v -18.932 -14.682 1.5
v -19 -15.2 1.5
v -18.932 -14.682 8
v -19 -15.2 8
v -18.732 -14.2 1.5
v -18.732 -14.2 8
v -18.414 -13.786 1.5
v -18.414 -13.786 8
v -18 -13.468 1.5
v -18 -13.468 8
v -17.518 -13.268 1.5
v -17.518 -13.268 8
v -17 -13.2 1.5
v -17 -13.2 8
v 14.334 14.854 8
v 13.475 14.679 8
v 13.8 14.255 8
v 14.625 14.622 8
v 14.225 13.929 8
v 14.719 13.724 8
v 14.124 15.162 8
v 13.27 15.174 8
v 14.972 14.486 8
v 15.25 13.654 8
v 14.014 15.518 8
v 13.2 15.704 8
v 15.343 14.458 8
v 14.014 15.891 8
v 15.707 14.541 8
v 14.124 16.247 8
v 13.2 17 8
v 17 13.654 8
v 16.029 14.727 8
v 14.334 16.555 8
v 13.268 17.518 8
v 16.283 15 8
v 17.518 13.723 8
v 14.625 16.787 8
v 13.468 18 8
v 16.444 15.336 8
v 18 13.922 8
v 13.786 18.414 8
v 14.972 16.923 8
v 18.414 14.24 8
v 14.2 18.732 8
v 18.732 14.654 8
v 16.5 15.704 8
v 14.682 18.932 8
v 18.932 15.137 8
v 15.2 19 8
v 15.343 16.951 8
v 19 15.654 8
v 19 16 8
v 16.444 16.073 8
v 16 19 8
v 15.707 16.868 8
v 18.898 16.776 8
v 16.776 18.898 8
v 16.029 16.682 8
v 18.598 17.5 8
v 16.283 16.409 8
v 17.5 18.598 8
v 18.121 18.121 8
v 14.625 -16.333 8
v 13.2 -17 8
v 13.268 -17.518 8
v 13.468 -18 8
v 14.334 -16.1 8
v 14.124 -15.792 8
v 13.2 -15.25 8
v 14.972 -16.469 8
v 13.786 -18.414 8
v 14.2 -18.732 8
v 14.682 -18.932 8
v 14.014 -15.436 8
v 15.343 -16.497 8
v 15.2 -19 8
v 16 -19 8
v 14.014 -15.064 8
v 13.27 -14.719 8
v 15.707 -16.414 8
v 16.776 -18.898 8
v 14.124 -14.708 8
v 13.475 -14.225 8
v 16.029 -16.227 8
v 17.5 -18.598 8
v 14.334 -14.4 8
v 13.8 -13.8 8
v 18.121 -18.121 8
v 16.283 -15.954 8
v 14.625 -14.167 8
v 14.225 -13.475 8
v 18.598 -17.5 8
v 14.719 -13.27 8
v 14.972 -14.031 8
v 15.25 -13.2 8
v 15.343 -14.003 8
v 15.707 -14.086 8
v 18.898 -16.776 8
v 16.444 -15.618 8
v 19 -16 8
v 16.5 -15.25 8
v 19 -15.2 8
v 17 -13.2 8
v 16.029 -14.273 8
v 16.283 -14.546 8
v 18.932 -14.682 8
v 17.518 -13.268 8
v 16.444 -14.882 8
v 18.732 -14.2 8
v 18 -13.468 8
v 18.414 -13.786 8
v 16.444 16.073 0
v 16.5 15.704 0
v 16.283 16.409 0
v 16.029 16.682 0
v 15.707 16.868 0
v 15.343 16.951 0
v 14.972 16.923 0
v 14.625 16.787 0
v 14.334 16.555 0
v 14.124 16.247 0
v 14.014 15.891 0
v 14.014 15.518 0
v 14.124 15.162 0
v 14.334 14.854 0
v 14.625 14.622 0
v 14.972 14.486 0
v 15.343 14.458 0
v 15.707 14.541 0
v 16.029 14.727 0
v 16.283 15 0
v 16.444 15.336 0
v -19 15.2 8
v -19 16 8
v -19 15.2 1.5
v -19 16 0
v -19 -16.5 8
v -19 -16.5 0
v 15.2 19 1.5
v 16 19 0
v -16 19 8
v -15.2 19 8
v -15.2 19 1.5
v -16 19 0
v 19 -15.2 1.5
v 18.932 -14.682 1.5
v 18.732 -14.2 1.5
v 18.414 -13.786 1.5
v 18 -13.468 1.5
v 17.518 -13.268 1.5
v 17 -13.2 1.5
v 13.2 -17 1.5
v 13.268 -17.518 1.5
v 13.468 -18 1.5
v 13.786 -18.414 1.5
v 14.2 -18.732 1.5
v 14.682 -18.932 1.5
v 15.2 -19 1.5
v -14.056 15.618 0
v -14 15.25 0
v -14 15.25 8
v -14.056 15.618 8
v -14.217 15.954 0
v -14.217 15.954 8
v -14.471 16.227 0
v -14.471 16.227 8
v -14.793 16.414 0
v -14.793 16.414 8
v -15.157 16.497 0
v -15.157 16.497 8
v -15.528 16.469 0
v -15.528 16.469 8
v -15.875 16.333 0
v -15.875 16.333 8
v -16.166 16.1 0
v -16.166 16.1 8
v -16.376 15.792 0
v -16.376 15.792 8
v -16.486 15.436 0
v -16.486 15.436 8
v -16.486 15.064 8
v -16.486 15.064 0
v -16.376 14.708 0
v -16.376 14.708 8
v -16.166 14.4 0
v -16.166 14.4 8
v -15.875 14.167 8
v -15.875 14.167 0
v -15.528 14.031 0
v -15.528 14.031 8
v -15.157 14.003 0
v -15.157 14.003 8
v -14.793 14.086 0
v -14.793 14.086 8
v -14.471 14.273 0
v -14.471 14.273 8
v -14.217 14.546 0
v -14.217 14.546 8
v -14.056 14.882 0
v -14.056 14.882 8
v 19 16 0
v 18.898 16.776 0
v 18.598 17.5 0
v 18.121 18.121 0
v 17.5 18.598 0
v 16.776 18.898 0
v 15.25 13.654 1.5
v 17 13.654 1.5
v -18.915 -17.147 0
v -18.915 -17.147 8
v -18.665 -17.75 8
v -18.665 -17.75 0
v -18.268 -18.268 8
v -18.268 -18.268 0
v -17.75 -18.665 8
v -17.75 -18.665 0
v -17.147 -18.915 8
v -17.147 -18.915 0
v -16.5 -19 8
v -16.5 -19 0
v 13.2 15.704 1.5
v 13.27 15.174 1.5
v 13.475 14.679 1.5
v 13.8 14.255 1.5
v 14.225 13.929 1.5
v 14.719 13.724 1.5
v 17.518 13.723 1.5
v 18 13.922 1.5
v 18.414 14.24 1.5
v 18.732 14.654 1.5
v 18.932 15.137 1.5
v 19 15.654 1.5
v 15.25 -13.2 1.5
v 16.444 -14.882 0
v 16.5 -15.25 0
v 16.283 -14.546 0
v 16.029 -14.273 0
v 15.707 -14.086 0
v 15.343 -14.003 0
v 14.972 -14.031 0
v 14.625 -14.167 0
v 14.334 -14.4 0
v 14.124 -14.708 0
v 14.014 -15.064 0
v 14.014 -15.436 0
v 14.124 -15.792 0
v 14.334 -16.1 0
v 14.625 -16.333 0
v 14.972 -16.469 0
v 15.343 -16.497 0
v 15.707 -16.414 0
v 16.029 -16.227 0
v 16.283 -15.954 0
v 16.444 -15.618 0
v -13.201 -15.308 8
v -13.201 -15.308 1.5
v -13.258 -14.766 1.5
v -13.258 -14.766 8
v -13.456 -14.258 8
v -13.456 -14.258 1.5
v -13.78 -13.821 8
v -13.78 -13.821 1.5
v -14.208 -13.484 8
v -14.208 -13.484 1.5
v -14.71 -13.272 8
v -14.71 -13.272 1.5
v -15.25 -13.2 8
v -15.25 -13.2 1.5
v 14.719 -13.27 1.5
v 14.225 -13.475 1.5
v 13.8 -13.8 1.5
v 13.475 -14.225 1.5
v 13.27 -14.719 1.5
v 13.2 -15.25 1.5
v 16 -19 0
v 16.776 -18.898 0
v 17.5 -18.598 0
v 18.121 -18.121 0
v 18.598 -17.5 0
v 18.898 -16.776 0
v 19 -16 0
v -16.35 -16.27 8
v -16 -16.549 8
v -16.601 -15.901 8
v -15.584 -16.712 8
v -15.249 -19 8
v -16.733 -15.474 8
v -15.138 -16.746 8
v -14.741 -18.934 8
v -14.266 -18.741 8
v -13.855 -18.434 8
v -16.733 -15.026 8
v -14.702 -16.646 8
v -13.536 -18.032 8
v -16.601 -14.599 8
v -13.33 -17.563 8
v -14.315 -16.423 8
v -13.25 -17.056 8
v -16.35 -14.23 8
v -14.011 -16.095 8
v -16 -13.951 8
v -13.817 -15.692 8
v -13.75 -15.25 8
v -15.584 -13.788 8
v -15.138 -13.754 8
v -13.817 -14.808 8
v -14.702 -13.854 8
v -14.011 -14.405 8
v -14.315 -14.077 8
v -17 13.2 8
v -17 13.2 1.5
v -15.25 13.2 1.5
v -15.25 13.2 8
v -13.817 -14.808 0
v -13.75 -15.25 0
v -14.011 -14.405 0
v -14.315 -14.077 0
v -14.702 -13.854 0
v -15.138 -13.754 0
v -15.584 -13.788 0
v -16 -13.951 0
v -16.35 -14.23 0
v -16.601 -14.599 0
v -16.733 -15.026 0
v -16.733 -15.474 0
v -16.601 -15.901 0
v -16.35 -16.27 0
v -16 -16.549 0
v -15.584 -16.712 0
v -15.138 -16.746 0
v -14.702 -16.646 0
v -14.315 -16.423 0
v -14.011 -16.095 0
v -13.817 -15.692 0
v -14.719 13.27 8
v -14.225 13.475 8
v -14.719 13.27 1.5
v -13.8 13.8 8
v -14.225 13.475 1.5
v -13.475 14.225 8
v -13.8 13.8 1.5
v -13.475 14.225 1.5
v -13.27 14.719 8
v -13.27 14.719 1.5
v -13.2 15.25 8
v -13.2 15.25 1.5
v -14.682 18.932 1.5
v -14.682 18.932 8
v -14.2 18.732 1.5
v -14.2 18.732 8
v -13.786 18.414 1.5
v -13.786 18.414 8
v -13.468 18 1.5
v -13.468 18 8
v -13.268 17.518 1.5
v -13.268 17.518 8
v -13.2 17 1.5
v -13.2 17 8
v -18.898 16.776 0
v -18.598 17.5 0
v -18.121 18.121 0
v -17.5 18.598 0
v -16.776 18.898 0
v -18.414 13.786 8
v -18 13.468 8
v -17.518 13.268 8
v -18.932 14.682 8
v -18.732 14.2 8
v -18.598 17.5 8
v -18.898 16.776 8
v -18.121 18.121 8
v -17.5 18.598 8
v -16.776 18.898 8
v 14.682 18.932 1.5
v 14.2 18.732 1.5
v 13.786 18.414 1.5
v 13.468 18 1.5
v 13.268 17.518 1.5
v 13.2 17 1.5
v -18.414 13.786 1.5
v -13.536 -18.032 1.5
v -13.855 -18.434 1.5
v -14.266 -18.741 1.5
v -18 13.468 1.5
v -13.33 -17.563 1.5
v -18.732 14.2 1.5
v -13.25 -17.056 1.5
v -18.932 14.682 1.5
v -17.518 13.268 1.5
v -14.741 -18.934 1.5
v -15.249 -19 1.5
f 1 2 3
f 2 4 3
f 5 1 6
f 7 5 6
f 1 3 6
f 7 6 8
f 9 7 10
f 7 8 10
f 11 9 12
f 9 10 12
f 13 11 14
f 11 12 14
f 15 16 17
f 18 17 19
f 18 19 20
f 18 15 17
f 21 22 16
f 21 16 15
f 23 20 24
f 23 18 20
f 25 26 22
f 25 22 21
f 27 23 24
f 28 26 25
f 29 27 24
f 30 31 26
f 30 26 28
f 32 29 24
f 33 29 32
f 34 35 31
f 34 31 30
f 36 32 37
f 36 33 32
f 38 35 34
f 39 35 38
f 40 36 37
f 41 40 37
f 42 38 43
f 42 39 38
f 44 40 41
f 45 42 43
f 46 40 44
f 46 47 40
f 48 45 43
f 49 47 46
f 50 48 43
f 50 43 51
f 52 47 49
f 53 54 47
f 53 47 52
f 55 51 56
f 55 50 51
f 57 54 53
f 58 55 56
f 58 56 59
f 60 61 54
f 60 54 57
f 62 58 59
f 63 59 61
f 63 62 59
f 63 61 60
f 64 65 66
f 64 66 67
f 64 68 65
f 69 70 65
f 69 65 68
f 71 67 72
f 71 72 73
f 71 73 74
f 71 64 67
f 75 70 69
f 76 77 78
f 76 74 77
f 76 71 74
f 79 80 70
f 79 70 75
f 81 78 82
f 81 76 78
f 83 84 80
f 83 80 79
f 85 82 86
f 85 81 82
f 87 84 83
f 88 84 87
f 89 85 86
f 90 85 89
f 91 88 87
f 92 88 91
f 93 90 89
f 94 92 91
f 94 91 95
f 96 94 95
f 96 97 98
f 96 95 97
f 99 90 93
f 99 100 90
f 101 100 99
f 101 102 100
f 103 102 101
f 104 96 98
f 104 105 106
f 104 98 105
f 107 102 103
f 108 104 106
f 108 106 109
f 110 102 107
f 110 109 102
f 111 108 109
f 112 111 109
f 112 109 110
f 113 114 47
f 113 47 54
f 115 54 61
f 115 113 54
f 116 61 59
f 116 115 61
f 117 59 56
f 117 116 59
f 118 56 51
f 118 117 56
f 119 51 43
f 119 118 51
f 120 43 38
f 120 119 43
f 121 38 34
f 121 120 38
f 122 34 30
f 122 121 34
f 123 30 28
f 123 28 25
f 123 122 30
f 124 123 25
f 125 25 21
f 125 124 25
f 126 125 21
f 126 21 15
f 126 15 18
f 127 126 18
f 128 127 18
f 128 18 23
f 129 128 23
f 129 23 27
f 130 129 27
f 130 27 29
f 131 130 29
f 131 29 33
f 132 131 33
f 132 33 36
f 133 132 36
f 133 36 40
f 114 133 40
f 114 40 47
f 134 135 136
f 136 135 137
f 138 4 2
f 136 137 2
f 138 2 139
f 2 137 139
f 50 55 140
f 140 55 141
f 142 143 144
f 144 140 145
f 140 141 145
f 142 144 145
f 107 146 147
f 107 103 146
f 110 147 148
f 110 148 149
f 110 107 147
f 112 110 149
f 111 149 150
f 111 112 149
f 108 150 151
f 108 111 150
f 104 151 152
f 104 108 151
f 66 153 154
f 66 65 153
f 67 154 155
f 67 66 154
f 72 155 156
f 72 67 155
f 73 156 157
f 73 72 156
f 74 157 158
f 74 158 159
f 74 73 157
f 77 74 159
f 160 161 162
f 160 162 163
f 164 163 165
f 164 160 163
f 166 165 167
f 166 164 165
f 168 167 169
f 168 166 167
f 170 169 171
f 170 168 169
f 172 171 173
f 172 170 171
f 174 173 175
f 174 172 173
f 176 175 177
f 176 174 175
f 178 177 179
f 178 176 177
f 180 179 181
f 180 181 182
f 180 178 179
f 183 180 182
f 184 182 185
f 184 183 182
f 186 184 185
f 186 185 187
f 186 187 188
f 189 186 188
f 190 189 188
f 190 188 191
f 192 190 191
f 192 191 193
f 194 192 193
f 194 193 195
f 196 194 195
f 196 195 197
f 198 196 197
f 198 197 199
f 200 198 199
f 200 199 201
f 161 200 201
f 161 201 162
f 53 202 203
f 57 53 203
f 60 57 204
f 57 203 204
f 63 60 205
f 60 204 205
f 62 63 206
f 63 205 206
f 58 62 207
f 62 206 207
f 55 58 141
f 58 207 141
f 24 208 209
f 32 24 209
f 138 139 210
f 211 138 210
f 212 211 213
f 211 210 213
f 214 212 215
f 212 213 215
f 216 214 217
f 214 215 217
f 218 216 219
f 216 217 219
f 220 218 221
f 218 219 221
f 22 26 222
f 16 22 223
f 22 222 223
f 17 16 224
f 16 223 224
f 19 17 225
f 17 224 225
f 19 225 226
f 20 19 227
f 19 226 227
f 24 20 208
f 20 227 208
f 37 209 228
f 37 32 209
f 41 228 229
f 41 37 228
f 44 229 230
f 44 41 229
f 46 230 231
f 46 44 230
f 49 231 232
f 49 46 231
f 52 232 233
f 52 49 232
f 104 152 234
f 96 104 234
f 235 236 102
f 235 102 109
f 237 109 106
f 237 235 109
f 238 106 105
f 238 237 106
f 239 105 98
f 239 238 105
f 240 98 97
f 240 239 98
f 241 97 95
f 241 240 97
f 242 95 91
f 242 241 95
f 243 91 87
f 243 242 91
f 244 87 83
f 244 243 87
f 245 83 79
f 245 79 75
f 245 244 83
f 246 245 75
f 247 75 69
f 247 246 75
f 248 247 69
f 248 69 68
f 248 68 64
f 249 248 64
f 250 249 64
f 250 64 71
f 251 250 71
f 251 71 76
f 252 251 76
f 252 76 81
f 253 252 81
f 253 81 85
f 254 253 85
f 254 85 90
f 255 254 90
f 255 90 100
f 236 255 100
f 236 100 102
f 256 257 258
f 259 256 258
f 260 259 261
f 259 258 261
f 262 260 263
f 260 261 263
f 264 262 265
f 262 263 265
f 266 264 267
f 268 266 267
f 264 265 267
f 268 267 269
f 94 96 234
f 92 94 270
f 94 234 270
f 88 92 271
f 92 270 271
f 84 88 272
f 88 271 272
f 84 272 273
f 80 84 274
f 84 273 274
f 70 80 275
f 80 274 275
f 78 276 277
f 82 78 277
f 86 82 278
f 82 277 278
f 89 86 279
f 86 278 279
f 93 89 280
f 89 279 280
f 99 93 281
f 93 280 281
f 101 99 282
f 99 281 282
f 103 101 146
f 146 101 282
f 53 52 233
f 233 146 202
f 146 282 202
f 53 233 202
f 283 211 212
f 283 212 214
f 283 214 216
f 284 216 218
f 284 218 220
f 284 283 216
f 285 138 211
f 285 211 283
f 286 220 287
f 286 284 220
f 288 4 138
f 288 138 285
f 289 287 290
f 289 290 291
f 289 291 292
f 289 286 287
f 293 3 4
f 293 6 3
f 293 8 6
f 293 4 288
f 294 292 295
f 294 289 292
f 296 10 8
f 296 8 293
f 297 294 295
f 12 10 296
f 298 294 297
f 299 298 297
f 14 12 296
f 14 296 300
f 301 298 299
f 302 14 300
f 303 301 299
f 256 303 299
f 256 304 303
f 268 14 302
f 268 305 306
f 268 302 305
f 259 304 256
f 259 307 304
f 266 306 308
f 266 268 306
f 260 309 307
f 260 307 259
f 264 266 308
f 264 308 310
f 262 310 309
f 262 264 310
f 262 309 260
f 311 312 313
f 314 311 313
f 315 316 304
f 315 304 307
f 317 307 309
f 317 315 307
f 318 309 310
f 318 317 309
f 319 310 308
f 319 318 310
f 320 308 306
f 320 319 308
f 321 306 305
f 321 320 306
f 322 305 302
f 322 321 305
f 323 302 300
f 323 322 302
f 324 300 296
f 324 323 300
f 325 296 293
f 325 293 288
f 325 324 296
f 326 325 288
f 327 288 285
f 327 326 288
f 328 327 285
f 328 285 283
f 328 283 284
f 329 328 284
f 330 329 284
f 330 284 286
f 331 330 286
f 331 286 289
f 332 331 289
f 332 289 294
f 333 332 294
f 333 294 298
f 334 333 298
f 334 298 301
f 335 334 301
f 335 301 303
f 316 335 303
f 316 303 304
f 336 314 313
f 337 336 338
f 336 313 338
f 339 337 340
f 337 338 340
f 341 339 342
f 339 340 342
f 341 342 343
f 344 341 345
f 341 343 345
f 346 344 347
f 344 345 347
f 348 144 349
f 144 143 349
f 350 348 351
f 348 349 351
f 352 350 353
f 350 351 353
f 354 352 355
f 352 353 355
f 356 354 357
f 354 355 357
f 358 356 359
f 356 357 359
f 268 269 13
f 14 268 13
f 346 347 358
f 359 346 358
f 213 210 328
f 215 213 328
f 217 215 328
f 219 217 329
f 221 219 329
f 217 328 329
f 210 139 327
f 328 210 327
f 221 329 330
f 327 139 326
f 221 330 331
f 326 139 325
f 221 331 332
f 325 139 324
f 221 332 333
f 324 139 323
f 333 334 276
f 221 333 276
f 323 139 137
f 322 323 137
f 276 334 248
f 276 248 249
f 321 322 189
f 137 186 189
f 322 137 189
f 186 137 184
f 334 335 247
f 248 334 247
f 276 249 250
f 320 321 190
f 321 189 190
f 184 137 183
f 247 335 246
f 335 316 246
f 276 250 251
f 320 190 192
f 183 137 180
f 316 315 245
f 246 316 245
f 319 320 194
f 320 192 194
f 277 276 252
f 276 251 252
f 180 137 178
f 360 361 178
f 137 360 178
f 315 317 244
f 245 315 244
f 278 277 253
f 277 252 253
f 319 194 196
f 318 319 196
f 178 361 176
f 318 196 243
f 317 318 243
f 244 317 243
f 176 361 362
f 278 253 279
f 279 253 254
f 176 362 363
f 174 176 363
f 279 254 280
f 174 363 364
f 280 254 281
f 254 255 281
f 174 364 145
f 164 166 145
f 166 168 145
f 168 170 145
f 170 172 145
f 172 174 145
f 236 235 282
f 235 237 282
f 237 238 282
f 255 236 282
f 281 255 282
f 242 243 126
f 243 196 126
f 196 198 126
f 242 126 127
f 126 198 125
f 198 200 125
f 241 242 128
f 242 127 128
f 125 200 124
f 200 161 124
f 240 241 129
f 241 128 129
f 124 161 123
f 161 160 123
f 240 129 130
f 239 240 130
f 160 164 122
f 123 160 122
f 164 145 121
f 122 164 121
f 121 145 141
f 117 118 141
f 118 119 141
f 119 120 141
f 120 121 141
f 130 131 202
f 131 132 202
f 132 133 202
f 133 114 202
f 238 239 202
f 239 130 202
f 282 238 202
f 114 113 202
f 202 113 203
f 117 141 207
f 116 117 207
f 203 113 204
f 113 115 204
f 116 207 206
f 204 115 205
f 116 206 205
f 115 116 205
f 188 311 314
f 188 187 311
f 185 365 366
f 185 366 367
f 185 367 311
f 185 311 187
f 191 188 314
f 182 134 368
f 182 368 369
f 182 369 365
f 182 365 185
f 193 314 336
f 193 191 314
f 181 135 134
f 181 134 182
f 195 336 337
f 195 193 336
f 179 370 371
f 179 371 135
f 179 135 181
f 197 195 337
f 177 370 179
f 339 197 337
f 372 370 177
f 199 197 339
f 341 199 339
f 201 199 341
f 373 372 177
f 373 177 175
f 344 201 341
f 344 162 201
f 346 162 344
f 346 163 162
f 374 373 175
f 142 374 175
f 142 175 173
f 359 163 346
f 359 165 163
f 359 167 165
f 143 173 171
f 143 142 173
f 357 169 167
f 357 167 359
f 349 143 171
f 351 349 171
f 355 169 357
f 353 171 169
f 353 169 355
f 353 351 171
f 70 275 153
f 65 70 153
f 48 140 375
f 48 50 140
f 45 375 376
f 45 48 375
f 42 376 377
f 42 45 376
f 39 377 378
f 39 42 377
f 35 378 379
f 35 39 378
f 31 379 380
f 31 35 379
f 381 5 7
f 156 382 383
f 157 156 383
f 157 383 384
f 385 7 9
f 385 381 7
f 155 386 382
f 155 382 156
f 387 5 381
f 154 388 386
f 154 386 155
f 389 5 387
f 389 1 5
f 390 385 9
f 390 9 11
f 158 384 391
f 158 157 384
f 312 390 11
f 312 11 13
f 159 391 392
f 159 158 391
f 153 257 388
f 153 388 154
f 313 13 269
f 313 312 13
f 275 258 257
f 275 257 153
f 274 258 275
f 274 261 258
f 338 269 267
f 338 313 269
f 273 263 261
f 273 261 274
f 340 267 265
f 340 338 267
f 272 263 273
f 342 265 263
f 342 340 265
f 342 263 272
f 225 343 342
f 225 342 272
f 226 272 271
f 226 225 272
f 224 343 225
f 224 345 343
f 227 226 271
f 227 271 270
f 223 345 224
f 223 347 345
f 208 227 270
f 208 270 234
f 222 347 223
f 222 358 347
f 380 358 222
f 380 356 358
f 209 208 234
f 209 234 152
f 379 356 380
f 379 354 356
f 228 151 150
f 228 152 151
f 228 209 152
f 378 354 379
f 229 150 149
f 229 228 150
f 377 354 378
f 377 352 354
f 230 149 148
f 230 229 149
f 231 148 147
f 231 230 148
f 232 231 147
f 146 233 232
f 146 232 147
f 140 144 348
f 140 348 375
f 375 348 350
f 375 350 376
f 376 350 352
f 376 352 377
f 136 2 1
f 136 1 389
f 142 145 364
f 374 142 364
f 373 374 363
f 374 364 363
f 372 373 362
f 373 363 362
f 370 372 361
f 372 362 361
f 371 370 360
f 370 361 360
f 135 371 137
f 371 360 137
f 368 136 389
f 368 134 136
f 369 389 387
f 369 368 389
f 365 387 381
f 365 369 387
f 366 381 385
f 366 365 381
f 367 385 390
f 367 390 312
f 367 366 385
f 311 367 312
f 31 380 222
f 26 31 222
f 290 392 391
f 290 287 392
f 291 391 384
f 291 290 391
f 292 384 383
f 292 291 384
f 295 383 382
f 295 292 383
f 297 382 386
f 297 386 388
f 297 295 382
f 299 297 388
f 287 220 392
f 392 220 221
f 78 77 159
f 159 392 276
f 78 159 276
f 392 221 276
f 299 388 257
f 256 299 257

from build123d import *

# Parameters (mm, degrees)
F0_R     = 1.5
F0_R_2   = 1.25
F1_DEPTH = 1.5
F2_DEPTH = 8
F3_R     = 2
F4_R     = 2


with BuildPart() as f1:
    # F0 (on Top) → F1 (new body)
    with BuildSketch(Plane.XY):
        with BuildLine():
            Line((-13.304709, -19), (13.2, -19))
            Line((13.2, -19), (13.2, -15.25))
            ThreePointArc((13.2, -15.25), (13.800431, -13.800431), (15.25, -13.2))
            Line((15.25, -13.2), (19, -13.2))
            Line((19, -13.2), (19, 13.654472))
            Line((19, 13.654472), (15.25, 13.654472))
            ThreePointArc((15.25, 13.654472), (13.800431, 14.254903), (13.2, 15.704472))
            Line((13.2, 15.704472), (13.2, 19))
            Line((13.2, 19), (-13.2, 19))
            Line((-13.2, 19), (-13.2, 15.25))
            ThreePointArc((-13.2, 15.25), (-13.800431, 13.800431), (-15.25, 13.2))
            Line((-15.25, 13.2), (-19, 13.2))
            Line((-19, 13.2), (-19, -13.2))
            Line((-19, -13.2), (-15.25, -13.2))
            ThreePointArc((-15.25, -13.2), (-13.780186, -13.820963), (-13.200811, -15.307662))
            Line((-13.200811, -15.307662), (-13.304709, -19))
        make_face()
        with BuildLine():
            Line((-16.5, -19), (-13.304709, -19))
            Line((-13.304709, -19), (-13.200811, -15.307662))
            ThreePointArc((-13.200811, -15.307662), (-13.780186, -13.820963), (-15.25, -13.2))
            Line((-15.25, -13.2), (-19, -13.2))
            Line((-19, -13.2), (-19, -16.5))
            ThreePointArc((-19, -16.5), (-18.267767, -18.267767), (-16.5, -19))
        make_face()
        with Locations((-15.25, -15.25)):
            Circle(F0_R, mode=Mode.SUBTRACT)
        with BuildLine():
            Line((13.2, -19), (16, -19))
            ThreePointArc((16, -19), (18.12132, -18.12132), (19, -16))
            Line((19, -16), (19, -13.2))
            Line((19, -13.2), (15.25, -13.2))
            ThreePointArc((15.25, -13.2), (13.800431, -13.800431), (13.2, -15.25))
            Line((13.2, -15.25), (13.2, -19))
        make_face()
        with Locations((15.25, -15.25)):
            Circle(F0_R_2, mode=Mode.SUBTRACT)
        with BuildLine():
            Line((15.25, 13.654472), (19, 13.654472))
            Line((19, 13.654472), (19, 16))
            ThreePointArc((19, 16), (18.12132, 18.12132), (16, 19))
            Line((16, 19), (13.2, 19))
            Line((13.2, 19), (13.2, 15.704472))
            ThreePointArc((13.2, 15.704472), (13.800431, 14.254903), (15.25, 13.654472))
        make_face()
        with Locations((15.25, 15.704472)):
            Circle(F0_R_2, mode=Mode.SUBTRACT)
        with BuildLine():
            Line((-19, 16), (-19, 13.2))
            Line((-19, 13.2), (-15.25, 13.2))
            ThreePointArc((-15.25, 13.2), (-13.800431, 13.800431), (-13.2, 15.25))
            Line((-13.2, 15.25), (-13.2, 19))
            Line((-13.2, 19), (-16, 19))
            ThreePointArc((-16, 19), (-18.12132, 18.12132), (-19, 16))
        make_face()
        with Locations((-15.25, 15.25)):
            Circle(F0_R_2, mode=Mode.SUBTRACT)
    extrude(amount=F1_DEPTH)

    # F0 (on Top) → F2 (join)
    with BuildSketch(Plane.XY):
        with BuildLine():
            Line((-16.5, -19), (-13.304709, -19))
            Line((-13.304709, -19), (-13.200811, -15.307662))
            ThreePointArc((-13.200811, -15.307662), (-13.780186, -13.820963), (-15.25, -13.2))
            Line((-15.25, -13.2), (-19, -13.2))
            Line((-19, -13.2), (-19, -16.5))
            ThreePointArc((-19, -16.5), (-18.267767, -18.267767), (-16.5, -19))
        make_face()
        with Locations((-15.25, -15.25)):
            Circle(F0_R, mode=Mode.SUBTRACT)
        with BuildLine():
            Line((13.2, -19), (16, -19))
            ThreePointArc((16, -19), (18.12132, -18.12132), (19, -16))
            Line((19, -16), (19, -13.2))
            Line((19, -13.2), (15.25, -13.2))
            ThreePointArc((15.25, -13.2), (13.800431, -13.800431), (13.2, -15.25))
            Line((13.2, -15.25), (13.2, -19))
        make_face()
        with Locations((15.25, -15.25)):
            Circle(F0_R_2, mode=Mode.SUBTRACT)
        with BuildLine():
            Line((15.25, 13.654472), (19, 13.654472))
            Line((19, 13.654472), (19, 16))
            ThreePointArc((19, 16), (18.12132, 18.12132), (16, 19))
            Line((16, 19), (13.2, 19))
            Line((13.2, 19), (13.2, 15.704472))
            ThreePointArc((13.2, 15.704472), (13.800431, 14.254903), (15.25, 13.654472))
        make_face()
        with Locations((15.25, 15.704472)):
            Circle(F0_R_2, mode=Mode.SUBTRACT)
        with BuildLine():
            Line((-19, 16), (-19, 13.2))
            Line((-19, 13.2), (-15.25, 13.2))
            ThreePointArc((-15.25, 13.2), (-13.800431, 13.800431), (-13.2, 15.25))
            Line((-13.2, 15.25), (-13.2, 19))
            Line((-13.2, 19), (-16, 19))
            ThreePointArc((-16, 19), (-18.12132, 18.12132), (-19, 16))
        make_face()
        with Locations((-15.25, 15.25)):
            Circle(F0_R_2, mode=Mode.SUBTRACT)
    extrude(amount=F2_DEPTH)

    # F3
    f3_edges = [f1.edges().sort_by_distance(p)[0] for p in [
        (-19, 13.2, 4.75),
    ]]
    fillet(f3_edges, radius=F3_R)

    # F4
    f4_edges = [f1.edges().sort_by_distance(p)[0] for p in [
        (-13.2, 19, 4.75),
        (13.2, 19, 4.75),
        (19, 13.654472, 4.75),
        (19, -13.2, 4.75),
        (13.2, -19, 4.75),
        (-13.304709, -19, 4.75),
        (-19, -13.2, 4.75),
    ]]
    fillet(f4_edges, radius=F4_R)


solid = f1.part
